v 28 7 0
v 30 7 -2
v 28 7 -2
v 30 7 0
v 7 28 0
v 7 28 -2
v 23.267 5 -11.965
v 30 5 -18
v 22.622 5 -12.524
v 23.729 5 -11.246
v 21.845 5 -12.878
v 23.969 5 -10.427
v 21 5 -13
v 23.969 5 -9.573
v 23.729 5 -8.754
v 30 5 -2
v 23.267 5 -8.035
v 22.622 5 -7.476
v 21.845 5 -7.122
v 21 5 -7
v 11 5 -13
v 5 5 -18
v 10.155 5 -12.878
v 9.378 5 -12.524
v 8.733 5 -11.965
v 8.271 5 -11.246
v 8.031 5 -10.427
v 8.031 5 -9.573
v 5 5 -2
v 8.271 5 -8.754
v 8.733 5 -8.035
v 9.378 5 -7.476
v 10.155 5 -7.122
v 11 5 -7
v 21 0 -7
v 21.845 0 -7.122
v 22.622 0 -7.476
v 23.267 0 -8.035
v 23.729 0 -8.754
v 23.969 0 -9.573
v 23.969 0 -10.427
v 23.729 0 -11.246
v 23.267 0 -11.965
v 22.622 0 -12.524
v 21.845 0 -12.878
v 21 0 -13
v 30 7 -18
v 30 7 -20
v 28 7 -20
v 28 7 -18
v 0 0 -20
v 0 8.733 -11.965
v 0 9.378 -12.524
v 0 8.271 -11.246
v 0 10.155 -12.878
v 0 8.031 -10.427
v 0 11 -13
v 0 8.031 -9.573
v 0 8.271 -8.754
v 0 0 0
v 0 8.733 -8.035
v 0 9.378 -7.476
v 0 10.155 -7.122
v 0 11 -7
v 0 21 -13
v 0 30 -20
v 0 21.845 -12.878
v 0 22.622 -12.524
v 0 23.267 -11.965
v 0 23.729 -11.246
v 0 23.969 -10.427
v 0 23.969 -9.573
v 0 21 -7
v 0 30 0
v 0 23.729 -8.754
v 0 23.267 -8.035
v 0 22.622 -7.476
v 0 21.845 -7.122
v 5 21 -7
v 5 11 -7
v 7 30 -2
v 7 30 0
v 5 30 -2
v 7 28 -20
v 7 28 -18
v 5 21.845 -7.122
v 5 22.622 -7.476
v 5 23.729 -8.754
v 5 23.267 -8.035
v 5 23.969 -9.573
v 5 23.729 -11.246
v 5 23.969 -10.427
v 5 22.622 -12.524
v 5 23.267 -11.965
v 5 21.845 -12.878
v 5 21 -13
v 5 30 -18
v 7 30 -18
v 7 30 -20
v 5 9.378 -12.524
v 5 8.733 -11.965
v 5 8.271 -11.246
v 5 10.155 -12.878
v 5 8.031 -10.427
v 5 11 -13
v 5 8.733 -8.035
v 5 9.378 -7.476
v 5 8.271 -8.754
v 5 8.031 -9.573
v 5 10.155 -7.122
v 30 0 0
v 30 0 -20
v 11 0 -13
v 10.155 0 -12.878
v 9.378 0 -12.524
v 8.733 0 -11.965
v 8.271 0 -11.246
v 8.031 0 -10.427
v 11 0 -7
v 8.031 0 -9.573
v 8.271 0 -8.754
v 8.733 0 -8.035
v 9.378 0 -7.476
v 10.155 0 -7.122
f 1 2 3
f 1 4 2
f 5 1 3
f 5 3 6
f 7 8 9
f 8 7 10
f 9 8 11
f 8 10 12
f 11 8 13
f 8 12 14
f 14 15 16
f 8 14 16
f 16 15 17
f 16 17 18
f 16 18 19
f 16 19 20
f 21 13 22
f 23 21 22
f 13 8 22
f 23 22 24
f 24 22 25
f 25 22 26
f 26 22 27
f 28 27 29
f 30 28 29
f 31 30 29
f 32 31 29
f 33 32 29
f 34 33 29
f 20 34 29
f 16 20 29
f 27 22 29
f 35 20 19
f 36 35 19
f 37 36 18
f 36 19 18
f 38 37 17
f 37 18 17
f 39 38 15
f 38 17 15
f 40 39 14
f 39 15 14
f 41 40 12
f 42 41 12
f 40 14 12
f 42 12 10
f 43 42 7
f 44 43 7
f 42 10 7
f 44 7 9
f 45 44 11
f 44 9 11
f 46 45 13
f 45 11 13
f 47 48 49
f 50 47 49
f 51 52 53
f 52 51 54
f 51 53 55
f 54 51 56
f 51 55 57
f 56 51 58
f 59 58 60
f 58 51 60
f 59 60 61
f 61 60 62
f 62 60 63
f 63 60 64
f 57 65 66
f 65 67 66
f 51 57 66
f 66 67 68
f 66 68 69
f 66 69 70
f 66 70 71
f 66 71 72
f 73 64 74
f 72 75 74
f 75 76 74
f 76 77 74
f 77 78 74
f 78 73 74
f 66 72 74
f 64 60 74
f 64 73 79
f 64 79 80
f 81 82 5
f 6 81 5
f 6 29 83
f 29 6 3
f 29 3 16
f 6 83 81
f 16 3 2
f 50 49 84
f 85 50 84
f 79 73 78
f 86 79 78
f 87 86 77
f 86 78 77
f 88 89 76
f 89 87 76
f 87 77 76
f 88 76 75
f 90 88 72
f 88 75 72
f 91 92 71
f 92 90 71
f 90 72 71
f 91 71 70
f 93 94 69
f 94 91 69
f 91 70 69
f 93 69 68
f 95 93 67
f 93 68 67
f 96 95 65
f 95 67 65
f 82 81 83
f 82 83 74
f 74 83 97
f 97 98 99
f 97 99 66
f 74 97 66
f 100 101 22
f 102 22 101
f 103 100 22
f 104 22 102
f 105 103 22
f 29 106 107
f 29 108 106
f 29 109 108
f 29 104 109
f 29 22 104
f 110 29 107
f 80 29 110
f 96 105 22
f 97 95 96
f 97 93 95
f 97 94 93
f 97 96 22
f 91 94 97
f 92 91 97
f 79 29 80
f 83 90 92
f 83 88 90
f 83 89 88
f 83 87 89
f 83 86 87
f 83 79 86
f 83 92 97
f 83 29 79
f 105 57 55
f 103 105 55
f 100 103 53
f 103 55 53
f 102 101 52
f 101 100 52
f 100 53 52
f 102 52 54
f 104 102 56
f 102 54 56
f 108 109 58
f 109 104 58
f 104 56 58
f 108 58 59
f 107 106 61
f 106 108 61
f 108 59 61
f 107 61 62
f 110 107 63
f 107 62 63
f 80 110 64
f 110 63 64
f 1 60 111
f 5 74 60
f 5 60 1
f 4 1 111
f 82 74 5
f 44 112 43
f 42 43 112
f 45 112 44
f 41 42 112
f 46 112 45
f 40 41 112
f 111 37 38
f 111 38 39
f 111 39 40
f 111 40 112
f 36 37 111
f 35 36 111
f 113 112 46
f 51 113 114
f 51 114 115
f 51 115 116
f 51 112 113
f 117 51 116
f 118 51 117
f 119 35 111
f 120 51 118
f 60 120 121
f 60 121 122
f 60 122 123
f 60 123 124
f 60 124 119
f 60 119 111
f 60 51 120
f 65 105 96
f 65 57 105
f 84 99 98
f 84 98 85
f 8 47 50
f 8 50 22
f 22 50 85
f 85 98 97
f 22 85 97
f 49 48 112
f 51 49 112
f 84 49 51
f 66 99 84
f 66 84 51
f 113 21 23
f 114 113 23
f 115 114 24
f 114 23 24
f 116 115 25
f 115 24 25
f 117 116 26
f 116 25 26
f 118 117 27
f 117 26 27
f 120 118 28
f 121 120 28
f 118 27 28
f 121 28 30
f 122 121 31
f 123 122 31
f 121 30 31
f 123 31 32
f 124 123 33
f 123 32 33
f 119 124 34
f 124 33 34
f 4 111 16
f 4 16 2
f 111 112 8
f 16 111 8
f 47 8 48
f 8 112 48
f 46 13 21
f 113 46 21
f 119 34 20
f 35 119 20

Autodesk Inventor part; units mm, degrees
ref_plane "YZ Plane" through (0, 0, 0) normal (1, 0, 0) x (0, 1, 0)
ref_plane "XZ Plane" through (0, 0, 0) normal (0, 1, 0) x (-1, 0, 0)
ref_plane "XY Plane" through (0, 0, 0) normal (0, 0, 1) x (1, 0, 0)
sketch "Boceto1" plane through (0, 0, 0) normal (1, 0, 0) x (0, 1, 0)
  line L0 (0, 0) -> (30, 0)
  line L1 (30, 0) -> (30, -20)
  line L2 (30, -20) -> (0, -20)
  line L3 (0, -20) -> (0, 0)
  line L4 (21, -10) -> (11, -10) construction
  line L5 (21, -7) -> (11, -7)
  line L6 (11, -13) -> (21, -13)
  arc A0 (21, -13) -> (21, -7) centre (21, -10) ccw
  arc A1 (11, -7) -> (11, -13) centre (11, -10) ccw
  point P0 (16, -10)
  point P1 (24, -10)
  point P2 (30, -10)
  point P3 (0, -10)
  point P4 (8, -10)
  dimension "d0" = 30
  dimension "d1" = 20
  dimension "d2" = 10
  dimension "d3" = 6
  dimension "d4" = 6
extrude "Extrusión1" add sketch "Boceto1" along normal blind 5
sketch "Boceto2" plane through (5, 0, 0) normal (1, 0, 0) x (0, 0, -1)
  line L0 (0, 0) -> (20, 0) projected
  line L1 (0, 0) -> (20, 0)
  line L2 (20, 0) -> (20, 5)
  line L3 (20, 5) -> (0, 5)
  line L4 (0, 5) -> (0, 0)
  dimension "d8" = 20
  dimension "d9" = 5
extrude "Extrusión2" add sketch "Boceto2" along normal blind 25
sketch "Boceto3" plane through (5, 5, 0) normal (0, 1, 0) x (1, 0, 0)
  line L0 (6, 10) -> (16, 10) construction
  line L1 (6, 7) -> (16, 7)
  line L2 (16, 13) -> (6, 13)
  arc A0 (6, 13) -> (6, 7) centre (6, 10) ccw
  arc A1 (16, 7) -> (16, 13) centre (16, 10) ccw
  line L3 (25, 20) -> (25, 0) projected
  line L4 (0, 0) -> (25, 0) projected
  point P0 (-5, 0)
  point P1 (11, 10)
  point P2 (25, 10)
  point P3 (19, 10)
  dimension "d12" = 10
  dimension "d13" = 6
  dimension "d14" = 6
  dimension "d15" = 10
extrude "Extrusión3" cut sketch "Boceto3" against normal blind 5
sketch "Boceto4" plane through (0, 0, 0) normal (0, 0, 1) x (1, 0, 0)
  line L0 (5, 30) -> (5, 5) projected
  line L1 (5, 5) -> (30, 5) projected
  line L2 (5, 5) -> (5, 28)
  line L3 (5, 30) -> (7, 30)
  line L4 (7, 30) -> (7, 28)
  line L5 (30, 5) -> (30, 7)
  line L6 (30, 7) -> (28, 7)
  line L7 (28, 7) -> (7, 28)
  point P0 (0, 0)
  point P1 (28, 5)
  dimension "d18" = 2
  dimension "d19" = 2
  dimension "d22" = 2
extrude "Extrusión4" add sketch "Boceto4" against normal blind 2
sketch "Boceto5" plane through (0, 0, -20) normal (0, 0, -1) x (-1, 0, 0)
  line L0 (-30, 0) -> (-30, 5) projected
  line L1 (-30, 0) -> (-30, 7) projected
  line L2 (-30, 5) -> (-30, 7)
  line L3 (-30, 7) -> (-28, 7)
  line L4 (-7, 30) -> (-7, 28) projected
  line L5 (-28, 7) -> (-7, 28)
  line L6 (-7, 28) -> (-7, 30)
  line L7 (-7, 30) -> (-5, 30)
  line L8 (-5, 30) -> (-5, 5)
  line L9 (-5, 5) -> (-30, 5)
  point P0 (0, 0)
  dimension "d23" = 2
extrude "Extrusión5" add sketch "Boceto5" against normal blind 2
properties part number "Esquinero" material "Aluminio 6061"
